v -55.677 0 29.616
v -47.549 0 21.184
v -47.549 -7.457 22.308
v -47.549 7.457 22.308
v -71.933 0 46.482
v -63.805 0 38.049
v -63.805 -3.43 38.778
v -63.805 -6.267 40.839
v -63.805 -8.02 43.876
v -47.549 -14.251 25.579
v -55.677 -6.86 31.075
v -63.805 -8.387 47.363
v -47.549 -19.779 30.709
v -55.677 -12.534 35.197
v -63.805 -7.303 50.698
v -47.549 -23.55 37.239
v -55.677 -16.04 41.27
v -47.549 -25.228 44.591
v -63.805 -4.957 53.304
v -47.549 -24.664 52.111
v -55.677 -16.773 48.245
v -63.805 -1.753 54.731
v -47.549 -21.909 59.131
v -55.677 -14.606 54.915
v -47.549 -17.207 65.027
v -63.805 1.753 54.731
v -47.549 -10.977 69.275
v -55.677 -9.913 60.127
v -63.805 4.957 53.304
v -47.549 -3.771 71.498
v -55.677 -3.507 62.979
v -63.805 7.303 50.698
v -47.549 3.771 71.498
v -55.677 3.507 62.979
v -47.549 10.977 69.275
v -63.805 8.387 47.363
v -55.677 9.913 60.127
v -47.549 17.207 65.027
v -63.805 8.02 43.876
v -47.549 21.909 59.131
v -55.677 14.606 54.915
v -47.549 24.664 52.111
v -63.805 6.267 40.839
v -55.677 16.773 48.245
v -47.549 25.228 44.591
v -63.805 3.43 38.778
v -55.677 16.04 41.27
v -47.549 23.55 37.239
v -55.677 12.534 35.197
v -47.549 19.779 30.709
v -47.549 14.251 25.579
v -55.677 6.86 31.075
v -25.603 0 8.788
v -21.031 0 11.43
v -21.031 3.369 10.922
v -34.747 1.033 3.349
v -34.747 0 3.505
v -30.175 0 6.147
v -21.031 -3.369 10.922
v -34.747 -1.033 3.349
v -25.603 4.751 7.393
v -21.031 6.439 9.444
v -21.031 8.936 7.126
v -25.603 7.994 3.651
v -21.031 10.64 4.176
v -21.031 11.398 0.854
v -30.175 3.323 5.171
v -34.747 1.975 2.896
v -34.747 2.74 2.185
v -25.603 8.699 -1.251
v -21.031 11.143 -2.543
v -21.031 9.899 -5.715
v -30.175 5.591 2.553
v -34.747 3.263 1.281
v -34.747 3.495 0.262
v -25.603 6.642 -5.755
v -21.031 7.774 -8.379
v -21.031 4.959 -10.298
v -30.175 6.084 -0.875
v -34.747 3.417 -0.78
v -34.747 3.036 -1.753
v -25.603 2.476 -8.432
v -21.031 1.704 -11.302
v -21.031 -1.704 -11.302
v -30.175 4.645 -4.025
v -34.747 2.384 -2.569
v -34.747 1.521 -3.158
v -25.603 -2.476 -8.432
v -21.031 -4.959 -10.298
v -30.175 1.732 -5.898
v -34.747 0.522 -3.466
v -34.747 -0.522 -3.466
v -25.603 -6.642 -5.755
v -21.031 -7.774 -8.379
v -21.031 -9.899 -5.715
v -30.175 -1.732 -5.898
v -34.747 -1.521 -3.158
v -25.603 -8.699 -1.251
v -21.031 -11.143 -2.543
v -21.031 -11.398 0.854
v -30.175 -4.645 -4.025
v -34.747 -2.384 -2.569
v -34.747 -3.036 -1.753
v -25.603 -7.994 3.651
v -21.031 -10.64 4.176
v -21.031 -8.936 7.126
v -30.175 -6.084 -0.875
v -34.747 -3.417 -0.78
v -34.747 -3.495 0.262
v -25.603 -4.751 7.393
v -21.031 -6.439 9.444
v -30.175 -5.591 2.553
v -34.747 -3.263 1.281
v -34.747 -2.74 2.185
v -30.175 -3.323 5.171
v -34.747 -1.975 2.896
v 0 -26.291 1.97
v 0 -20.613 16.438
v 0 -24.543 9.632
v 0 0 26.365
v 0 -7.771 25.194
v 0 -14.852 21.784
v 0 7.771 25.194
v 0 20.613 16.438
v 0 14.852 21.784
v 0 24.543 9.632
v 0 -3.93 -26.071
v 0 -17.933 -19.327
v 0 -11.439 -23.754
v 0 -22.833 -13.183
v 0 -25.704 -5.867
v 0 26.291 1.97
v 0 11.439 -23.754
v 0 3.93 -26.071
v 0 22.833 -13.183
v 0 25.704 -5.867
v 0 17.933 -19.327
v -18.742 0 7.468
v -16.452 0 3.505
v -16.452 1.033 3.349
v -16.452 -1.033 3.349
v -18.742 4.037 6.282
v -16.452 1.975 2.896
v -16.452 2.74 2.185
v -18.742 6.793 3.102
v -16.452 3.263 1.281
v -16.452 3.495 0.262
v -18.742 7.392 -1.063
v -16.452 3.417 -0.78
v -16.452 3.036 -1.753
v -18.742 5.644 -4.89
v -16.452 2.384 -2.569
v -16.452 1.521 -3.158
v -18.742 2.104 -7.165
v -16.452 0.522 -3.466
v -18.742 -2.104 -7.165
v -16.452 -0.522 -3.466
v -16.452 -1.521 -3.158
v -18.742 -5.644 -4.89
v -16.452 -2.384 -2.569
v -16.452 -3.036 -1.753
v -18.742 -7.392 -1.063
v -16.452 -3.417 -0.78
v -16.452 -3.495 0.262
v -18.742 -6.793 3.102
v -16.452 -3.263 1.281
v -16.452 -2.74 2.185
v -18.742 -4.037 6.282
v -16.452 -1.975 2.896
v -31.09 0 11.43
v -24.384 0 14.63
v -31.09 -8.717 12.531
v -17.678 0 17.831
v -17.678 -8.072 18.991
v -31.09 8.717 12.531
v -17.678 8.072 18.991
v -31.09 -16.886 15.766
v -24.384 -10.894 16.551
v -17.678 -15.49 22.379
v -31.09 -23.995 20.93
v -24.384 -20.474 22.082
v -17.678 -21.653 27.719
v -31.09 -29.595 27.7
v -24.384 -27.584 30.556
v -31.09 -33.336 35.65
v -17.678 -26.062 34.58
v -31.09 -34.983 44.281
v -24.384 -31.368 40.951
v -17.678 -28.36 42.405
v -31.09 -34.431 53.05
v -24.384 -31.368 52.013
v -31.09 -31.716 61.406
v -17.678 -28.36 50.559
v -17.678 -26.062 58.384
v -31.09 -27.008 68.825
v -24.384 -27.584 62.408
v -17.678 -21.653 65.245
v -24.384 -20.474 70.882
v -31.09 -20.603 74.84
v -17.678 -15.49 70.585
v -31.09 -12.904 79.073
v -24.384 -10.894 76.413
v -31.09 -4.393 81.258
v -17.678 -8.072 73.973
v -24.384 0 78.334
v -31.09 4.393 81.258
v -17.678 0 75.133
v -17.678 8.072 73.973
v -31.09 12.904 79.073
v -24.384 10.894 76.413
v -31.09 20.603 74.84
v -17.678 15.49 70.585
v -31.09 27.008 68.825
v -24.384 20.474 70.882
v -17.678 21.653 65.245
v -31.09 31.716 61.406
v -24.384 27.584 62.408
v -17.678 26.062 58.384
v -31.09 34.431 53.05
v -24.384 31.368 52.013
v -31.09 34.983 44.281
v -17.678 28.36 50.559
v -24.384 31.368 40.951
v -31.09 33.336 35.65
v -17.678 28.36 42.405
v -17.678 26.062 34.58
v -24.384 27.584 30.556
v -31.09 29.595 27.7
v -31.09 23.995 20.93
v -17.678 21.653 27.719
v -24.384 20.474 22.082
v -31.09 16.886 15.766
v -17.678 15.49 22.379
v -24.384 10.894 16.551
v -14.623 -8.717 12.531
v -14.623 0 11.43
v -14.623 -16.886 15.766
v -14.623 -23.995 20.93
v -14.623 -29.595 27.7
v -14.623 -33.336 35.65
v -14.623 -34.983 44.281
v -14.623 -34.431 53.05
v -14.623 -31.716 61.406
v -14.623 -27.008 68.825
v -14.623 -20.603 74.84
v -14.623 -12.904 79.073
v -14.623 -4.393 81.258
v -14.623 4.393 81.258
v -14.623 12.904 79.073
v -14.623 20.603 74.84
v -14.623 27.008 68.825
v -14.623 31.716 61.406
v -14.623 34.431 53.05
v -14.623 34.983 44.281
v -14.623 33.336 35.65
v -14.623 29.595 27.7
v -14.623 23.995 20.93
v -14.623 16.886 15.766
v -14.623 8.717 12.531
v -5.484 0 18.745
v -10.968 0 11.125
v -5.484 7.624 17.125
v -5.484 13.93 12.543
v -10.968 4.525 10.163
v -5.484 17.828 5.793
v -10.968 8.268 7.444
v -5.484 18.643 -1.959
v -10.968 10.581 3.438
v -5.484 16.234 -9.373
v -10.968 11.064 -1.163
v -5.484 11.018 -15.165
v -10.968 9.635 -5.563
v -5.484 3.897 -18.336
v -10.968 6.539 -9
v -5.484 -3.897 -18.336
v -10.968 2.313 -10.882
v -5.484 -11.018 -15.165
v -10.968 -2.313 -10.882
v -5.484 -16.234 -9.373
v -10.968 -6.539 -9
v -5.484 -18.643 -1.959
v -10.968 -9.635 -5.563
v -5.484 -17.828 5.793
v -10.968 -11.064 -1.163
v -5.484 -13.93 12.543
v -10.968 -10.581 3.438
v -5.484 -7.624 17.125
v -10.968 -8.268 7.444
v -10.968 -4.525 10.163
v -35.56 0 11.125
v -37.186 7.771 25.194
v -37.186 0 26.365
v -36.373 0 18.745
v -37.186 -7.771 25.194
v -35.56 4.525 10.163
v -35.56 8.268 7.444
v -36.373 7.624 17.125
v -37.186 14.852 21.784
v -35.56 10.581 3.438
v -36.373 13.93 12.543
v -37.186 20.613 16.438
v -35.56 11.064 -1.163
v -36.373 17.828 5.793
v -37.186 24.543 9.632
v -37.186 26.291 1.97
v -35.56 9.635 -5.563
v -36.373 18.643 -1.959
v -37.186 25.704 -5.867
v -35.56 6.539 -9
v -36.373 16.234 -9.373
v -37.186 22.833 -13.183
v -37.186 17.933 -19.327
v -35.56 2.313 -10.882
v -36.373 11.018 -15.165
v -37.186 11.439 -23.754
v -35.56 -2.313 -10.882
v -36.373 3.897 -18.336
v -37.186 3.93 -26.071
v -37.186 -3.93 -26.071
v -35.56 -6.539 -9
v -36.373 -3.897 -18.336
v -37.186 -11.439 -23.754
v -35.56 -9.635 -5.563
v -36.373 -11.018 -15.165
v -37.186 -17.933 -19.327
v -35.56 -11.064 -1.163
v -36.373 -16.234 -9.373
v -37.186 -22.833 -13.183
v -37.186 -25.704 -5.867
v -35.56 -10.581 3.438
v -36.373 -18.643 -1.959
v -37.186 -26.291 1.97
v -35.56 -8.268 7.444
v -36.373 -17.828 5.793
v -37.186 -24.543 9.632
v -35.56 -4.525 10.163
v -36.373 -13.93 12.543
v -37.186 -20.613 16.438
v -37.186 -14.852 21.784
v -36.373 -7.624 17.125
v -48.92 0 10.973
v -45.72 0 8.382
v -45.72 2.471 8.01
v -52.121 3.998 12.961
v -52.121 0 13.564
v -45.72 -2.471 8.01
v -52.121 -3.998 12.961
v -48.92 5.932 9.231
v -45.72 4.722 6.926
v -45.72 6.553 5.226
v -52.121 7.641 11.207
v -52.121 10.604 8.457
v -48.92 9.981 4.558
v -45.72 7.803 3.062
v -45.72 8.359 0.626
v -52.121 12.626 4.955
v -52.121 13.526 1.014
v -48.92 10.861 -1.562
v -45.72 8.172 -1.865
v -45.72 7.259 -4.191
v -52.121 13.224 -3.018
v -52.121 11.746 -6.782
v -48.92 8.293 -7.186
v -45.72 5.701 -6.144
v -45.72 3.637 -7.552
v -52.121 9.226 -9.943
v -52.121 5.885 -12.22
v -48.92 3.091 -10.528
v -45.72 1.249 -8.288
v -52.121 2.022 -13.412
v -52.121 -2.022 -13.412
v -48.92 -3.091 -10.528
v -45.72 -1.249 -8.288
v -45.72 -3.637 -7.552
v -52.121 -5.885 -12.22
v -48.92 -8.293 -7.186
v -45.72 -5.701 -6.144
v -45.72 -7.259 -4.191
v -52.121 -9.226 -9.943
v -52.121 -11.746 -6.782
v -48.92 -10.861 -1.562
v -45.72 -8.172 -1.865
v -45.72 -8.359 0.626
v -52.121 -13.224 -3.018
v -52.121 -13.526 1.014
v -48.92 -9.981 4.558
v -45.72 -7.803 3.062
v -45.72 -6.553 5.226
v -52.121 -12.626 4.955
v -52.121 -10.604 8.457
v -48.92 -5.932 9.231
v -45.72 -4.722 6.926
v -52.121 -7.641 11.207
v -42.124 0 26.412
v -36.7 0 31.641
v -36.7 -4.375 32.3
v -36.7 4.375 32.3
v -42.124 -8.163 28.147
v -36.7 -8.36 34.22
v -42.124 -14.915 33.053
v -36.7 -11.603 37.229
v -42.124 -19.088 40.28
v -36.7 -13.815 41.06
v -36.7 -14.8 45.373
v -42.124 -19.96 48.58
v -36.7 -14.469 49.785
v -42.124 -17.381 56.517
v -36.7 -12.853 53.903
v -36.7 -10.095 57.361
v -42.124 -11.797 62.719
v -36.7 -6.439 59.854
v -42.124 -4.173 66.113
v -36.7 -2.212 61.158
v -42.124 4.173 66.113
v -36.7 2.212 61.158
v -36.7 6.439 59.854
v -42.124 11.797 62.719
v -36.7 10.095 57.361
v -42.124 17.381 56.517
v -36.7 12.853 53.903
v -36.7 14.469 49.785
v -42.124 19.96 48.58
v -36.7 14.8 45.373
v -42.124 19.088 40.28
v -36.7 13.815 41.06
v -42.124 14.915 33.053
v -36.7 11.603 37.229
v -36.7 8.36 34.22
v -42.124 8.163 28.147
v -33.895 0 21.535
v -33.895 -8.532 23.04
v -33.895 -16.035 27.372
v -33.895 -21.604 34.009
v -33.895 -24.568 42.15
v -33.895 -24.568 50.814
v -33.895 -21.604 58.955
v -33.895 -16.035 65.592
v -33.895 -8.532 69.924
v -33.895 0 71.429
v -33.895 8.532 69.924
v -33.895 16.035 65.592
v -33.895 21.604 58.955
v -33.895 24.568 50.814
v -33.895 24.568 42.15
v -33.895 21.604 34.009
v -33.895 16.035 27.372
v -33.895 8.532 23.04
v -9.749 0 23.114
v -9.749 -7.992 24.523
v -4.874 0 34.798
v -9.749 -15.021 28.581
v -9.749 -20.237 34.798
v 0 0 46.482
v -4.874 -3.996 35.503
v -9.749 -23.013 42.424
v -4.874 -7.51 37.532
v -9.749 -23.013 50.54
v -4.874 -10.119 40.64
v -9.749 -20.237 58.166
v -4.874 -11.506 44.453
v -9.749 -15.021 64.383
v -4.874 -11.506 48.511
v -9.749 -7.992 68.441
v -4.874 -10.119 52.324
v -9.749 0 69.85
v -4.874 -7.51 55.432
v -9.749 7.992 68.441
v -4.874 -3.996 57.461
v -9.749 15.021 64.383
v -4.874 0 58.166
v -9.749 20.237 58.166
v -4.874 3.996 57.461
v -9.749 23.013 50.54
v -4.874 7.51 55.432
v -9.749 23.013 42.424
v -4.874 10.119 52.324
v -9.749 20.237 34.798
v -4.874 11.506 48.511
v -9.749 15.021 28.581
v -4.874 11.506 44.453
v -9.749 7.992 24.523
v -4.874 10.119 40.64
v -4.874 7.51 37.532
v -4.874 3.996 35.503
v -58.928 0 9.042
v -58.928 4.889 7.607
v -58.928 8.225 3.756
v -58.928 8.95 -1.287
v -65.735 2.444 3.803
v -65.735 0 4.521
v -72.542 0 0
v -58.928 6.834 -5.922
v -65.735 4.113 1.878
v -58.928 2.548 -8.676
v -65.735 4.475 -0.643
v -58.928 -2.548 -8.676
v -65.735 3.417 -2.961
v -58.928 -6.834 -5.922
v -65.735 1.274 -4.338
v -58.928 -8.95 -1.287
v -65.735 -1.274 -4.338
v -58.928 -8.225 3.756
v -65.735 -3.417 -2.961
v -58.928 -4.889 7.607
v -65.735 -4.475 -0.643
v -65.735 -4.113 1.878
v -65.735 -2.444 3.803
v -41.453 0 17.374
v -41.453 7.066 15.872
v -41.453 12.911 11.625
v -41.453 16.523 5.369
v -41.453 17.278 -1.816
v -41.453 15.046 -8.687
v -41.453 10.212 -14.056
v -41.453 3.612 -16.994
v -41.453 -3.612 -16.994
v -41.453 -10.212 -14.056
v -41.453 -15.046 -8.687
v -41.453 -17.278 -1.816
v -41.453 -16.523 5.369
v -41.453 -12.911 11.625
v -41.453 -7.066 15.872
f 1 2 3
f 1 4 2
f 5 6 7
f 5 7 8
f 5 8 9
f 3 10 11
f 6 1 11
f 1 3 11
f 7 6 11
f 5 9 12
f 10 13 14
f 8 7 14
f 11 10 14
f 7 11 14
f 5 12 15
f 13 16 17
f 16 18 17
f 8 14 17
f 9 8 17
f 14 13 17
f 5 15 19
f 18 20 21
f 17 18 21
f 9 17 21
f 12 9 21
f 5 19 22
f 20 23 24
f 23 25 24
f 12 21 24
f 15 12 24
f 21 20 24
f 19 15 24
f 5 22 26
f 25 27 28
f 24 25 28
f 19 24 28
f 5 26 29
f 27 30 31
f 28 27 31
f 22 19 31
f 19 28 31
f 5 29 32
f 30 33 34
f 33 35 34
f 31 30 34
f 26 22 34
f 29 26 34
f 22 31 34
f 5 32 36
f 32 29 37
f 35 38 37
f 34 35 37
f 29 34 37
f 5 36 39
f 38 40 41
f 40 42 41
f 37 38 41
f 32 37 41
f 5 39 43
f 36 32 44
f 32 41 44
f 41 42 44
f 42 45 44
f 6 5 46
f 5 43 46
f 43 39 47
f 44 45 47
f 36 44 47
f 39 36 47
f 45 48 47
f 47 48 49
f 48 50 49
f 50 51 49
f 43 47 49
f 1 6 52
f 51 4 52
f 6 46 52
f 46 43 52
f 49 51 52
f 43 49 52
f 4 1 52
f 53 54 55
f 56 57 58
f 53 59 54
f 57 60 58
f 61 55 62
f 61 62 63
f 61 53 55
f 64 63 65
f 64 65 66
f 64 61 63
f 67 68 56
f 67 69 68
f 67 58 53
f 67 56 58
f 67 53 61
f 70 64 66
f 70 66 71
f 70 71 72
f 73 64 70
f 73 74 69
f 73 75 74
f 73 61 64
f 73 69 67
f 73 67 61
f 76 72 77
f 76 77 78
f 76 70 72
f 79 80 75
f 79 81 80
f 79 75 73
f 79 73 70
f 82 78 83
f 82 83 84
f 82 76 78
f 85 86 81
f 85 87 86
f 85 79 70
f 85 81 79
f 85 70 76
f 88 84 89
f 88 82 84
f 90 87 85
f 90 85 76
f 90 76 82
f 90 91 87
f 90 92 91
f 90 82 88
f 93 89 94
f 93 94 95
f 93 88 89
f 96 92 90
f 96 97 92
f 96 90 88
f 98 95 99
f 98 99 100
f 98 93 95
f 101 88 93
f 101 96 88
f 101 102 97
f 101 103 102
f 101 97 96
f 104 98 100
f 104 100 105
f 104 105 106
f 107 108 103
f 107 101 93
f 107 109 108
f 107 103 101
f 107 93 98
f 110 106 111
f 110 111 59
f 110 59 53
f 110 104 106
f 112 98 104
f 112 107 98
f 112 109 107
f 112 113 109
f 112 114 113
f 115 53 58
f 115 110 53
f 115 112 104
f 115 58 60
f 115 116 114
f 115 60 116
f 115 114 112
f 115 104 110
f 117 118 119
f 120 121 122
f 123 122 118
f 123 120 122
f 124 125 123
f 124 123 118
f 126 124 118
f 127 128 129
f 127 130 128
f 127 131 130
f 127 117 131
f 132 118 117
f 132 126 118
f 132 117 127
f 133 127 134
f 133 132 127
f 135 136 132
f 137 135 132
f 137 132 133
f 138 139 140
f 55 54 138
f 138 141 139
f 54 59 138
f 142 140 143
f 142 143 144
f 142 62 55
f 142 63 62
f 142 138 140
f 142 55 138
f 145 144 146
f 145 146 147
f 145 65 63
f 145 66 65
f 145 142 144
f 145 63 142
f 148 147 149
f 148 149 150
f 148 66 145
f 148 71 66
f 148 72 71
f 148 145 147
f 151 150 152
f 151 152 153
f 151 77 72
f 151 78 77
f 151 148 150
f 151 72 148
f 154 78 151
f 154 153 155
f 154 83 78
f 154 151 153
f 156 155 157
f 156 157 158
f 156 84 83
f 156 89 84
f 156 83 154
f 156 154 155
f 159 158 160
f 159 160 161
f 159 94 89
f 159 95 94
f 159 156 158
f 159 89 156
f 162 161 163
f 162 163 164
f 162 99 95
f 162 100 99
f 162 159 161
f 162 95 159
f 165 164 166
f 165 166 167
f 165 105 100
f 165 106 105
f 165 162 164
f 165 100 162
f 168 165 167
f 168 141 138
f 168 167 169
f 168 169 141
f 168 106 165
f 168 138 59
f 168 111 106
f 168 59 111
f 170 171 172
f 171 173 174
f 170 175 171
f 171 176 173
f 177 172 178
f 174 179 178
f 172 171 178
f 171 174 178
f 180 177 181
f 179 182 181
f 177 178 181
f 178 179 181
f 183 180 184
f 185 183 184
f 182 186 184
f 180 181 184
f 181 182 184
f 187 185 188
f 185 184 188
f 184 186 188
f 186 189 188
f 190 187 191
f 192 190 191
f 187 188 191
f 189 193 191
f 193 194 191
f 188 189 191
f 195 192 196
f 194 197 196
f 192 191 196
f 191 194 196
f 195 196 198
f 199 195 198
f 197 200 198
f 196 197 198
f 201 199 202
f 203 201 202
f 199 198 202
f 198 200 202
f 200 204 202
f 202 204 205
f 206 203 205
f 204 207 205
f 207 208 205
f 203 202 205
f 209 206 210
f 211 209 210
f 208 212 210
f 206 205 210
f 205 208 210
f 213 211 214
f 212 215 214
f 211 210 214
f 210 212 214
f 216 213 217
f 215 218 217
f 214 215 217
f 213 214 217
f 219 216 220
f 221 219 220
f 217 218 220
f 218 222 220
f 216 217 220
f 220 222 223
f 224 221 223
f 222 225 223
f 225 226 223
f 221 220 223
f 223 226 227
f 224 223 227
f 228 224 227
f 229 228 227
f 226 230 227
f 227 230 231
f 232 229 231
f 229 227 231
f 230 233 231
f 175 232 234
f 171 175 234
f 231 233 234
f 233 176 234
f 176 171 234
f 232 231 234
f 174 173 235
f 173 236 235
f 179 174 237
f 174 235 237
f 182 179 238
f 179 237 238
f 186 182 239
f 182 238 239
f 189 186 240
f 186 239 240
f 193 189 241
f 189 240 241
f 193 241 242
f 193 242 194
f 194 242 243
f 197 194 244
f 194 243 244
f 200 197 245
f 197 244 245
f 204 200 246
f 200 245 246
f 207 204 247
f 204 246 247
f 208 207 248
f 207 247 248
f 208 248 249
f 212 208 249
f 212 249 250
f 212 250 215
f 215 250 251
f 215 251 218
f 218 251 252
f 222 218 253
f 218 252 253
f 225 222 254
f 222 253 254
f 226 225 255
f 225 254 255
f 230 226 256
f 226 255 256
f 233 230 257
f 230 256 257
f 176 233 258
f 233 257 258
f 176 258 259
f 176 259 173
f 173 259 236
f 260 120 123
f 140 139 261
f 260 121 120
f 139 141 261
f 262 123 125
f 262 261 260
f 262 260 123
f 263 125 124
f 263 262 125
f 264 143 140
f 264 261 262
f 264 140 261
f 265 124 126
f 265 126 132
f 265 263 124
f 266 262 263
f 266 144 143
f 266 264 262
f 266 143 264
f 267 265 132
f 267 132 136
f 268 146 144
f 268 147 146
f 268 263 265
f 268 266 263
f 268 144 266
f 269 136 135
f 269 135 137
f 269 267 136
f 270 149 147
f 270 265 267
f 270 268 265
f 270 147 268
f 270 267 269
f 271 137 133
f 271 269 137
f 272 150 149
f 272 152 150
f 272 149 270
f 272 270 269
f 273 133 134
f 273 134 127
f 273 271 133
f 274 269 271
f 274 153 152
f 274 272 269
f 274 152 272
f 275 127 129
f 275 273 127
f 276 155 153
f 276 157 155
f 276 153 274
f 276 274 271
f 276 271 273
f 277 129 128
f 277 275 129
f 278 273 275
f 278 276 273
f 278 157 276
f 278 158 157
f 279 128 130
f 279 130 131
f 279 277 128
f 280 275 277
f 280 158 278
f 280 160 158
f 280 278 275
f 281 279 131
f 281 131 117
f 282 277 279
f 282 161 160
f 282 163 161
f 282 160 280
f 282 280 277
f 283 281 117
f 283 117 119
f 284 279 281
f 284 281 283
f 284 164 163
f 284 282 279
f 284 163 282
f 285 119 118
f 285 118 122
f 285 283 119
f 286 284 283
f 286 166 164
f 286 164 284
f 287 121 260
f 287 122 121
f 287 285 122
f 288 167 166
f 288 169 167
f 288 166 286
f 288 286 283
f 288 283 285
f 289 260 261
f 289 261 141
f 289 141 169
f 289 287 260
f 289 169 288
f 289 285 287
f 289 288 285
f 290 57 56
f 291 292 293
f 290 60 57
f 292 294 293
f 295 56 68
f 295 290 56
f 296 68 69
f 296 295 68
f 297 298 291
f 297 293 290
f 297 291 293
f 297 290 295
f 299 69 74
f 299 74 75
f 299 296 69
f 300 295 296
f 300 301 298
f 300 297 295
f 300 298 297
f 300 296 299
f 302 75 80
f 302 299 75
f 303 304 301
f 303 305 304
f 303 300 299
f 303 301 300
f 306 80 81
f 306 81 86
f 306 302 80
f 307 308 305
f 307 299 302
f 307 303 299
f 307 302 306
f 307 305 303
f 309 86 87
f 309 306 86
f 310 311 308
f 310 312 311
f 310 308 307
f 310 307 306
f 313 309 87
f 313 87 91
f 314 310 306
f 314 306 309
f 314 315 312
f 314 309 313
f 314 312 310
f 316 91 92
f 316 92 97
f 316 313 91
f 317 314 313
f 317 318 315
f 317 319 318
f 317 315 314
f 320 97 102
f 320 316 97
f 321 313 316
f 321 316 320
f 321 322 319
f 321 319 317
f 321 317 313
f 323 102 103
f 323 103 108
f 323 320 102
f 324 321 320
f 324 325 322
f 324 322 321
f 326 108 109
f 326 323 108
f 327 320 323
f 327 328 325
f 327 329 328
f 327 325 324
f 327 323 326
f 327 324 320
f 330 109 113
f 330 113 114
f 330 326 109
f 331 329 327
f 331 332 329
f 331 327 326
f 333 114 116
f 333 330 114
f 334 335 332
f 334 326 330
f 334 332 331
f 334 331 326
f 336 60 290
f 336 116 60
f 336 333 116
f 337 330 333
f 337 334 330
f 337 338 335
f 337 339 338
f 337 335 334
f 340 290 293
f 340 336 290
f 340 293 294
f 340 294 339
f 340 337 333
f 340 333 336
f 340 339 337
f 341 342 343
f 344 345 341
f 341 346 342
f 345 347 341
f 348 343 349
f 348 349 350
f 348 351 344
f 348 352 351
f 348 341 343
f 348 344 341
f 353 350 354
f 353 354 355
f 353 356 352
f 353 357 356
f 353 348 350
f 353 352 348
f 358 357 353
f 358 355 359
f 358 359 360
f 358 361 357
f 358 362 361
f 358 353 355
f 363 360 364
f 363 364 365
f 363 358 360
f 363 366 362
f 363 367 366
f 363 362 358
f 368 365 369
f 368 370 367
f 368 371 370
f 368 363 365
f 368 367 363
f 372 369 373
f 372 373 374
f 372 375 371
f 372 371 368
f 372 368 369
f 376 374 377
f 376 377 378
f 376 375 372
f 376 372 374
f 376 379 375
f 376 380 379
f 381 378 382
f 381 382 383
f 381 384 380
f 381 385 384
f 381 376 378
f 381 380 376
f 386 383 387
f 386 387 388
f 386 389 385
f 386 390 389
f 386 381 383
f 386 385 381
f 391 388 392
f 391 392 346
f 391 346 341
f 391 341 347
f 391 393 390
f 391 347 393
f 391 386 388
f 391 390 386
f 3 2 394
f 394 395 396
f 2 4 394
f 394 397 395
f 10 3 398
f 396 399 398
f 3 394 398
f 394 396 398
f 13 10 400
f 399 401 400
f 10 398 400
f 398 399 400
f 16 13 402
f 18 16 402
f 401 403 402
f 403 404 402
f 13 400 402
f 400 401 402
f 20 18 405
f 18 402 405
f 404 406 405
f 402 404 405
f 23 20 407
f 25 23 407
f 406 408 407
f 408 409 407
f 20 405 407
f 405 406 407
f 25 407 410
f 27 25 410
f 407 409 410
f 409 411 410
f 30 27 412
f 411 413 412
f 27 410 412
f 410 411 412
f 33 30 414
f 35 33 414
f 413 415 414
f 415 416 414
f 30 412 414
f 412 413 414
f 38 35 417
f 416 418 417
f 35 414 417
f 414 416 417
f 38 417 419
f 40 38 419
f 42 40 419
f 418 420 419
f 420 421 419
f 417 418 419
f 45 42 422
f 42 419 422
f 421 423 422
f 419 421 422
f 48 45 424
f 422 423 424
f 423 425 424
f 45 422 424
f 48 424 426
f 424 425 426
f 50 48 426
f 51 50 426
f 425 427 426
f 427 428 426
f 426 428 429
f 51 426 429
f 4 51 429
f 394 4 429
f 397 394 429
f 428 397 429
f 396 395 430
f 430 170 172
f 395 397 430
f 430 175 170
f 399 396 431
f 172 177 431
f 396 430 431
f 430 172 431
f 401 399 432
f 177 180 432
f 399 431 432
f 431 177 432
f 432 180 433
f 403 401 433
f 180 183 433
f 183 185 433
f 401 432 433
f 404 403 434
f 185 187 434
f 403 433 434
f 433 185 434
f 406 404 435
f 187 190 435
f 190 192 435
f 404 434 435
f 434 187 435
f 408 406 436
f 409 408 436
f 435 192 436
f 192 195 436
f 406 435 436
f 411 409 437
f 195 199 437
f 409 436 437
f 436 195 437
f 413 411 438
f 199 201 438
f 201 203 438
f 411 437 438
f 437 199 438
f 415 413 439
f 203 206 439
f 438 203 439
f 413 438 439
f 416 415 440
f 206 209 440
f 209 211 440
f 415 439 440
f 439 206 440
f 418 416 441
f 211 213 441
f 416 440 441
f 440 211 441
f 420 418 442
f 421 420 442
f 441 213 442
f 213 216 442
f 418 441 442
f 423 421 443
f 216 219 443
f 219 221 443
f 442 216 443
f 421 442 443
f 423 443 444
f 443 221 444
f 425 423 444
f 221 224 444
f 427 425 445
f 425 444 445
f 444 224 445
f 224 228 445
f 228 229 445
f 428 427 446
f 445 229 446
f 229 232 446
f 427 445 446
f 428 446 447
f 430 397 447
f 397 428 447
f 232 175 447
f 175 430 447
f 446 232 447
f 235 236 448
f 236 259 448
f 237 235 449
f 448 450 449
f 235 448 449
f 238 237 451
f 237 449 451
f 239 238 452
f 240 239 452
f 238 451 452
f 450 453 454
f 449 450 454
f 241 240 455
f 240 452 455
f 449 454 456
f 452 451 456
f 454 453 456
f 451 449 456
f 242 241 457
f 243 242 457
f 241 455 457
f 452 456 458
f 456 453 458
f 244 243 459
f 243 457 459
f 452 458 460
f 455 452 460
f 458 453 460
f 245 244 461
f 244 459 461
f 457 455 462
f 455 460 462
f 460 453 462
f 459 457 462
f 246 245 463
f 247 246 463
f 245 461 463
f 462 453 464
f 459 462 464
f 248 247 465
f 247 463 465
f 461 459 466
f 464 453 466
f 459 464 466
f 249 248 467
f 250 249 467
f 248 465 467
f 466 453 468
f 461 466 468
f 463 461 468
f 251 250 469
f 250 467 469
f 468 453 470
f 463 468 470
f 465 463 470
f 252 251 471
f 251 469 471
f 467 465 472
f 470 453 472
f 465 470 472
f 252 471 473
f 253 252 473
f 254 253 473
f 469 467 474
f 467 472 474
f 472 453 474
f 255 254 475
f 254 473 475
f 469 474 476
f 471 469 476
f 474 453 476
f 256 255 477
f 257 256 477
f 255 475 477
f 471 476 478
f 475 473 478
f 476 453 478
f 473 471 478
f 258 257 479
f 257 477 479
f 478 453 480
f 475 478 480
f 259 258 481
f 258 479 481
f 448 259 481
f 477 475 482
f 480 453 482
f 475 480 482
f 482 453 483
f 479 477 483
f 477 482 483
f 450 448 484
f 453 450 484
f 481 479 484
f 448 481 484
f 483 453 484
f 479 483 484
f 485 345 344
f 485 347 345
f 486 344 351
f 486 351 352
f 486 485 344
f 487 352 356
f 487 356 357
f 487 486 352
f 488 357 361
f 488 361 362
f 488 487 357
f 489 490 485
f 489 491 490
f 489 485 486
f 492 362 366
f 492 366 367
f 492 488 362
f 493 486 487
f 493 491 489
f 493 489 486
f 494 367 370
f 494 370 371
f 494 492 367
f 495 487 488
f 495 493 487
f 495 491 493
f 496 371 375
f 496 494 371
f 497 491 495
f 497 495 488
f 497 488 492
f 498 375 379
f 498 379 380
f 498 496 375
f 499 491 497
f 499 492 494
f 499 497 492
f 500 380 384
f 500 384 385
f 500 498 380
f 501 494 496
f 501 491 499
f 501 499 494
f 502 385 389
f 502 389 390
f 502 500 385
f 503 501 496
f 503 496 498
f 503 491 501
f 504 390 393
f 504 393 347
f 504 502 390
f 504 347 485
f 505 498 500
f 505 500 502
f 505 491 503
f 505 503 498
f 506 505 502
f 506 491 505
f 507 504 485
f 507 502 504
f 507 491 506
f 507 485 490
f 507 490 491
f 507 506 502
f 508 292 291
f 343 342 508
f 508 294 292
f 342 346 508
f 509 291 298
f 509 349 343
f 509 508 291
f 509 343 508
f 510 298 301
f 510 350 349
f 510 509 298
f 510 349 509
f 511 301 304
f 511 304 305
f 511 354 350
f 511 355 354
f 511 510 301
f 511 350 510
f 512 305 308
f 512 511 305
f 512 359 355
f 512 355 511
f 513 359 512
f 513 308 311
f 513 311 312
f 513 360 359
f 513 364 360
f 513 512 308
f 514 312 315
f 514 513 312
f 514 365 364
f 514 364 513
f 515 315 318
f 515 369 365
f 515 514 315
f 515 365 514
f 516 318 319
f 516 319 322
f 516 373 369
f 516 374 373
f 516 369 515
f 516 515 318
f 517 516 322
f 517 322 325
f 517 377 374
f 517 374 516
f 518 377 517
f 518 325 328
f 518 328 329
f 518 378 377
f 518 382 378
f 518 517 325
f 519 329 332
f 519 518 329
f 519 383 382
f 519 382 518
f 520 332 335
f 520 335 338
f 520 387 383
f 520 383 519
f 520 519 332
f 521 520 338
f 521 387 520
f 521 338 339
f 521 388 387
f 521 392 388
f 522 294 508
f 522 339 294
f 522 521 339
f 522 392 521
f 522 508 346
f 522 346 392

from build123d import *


with BuildPart() as f2:
    # F1 (on Front) → F2 (revolve)
    with BuildSketch(Plane.XZ):
        Polygon((-14.623474, 11.430001), (0, 46.482004), (-71.9328, 46.482004), (-47.548801, 21.183599), (-36.699557, 31.640699), (-31.0896, 11.430001), (-17.678401, 17.8308), align=None)
    revolve(axis=Axis((-35.9664, 0, 46.482004), (-1, 0, 0)))


with BuildPart() as f3:
    # F0 (on Front) → F3 (revolve)
    with BuildSketch(Plane.XZ):
        Polygon((-72.542399, 0), (0, 0), (0, 26.3652), (-16.452427, 3.5052), (-21.031201, 11.430001), (-34.747202, 3.5052), (-37.185602, 26.3652), (-45.72, 8.382), (-52.120801, 13.563599), align=None)
    revolve(axis=Axis((-36.2712, 0, 0), (-1, 0, 0)))


solid = Compound([f2.part, f3.part])
